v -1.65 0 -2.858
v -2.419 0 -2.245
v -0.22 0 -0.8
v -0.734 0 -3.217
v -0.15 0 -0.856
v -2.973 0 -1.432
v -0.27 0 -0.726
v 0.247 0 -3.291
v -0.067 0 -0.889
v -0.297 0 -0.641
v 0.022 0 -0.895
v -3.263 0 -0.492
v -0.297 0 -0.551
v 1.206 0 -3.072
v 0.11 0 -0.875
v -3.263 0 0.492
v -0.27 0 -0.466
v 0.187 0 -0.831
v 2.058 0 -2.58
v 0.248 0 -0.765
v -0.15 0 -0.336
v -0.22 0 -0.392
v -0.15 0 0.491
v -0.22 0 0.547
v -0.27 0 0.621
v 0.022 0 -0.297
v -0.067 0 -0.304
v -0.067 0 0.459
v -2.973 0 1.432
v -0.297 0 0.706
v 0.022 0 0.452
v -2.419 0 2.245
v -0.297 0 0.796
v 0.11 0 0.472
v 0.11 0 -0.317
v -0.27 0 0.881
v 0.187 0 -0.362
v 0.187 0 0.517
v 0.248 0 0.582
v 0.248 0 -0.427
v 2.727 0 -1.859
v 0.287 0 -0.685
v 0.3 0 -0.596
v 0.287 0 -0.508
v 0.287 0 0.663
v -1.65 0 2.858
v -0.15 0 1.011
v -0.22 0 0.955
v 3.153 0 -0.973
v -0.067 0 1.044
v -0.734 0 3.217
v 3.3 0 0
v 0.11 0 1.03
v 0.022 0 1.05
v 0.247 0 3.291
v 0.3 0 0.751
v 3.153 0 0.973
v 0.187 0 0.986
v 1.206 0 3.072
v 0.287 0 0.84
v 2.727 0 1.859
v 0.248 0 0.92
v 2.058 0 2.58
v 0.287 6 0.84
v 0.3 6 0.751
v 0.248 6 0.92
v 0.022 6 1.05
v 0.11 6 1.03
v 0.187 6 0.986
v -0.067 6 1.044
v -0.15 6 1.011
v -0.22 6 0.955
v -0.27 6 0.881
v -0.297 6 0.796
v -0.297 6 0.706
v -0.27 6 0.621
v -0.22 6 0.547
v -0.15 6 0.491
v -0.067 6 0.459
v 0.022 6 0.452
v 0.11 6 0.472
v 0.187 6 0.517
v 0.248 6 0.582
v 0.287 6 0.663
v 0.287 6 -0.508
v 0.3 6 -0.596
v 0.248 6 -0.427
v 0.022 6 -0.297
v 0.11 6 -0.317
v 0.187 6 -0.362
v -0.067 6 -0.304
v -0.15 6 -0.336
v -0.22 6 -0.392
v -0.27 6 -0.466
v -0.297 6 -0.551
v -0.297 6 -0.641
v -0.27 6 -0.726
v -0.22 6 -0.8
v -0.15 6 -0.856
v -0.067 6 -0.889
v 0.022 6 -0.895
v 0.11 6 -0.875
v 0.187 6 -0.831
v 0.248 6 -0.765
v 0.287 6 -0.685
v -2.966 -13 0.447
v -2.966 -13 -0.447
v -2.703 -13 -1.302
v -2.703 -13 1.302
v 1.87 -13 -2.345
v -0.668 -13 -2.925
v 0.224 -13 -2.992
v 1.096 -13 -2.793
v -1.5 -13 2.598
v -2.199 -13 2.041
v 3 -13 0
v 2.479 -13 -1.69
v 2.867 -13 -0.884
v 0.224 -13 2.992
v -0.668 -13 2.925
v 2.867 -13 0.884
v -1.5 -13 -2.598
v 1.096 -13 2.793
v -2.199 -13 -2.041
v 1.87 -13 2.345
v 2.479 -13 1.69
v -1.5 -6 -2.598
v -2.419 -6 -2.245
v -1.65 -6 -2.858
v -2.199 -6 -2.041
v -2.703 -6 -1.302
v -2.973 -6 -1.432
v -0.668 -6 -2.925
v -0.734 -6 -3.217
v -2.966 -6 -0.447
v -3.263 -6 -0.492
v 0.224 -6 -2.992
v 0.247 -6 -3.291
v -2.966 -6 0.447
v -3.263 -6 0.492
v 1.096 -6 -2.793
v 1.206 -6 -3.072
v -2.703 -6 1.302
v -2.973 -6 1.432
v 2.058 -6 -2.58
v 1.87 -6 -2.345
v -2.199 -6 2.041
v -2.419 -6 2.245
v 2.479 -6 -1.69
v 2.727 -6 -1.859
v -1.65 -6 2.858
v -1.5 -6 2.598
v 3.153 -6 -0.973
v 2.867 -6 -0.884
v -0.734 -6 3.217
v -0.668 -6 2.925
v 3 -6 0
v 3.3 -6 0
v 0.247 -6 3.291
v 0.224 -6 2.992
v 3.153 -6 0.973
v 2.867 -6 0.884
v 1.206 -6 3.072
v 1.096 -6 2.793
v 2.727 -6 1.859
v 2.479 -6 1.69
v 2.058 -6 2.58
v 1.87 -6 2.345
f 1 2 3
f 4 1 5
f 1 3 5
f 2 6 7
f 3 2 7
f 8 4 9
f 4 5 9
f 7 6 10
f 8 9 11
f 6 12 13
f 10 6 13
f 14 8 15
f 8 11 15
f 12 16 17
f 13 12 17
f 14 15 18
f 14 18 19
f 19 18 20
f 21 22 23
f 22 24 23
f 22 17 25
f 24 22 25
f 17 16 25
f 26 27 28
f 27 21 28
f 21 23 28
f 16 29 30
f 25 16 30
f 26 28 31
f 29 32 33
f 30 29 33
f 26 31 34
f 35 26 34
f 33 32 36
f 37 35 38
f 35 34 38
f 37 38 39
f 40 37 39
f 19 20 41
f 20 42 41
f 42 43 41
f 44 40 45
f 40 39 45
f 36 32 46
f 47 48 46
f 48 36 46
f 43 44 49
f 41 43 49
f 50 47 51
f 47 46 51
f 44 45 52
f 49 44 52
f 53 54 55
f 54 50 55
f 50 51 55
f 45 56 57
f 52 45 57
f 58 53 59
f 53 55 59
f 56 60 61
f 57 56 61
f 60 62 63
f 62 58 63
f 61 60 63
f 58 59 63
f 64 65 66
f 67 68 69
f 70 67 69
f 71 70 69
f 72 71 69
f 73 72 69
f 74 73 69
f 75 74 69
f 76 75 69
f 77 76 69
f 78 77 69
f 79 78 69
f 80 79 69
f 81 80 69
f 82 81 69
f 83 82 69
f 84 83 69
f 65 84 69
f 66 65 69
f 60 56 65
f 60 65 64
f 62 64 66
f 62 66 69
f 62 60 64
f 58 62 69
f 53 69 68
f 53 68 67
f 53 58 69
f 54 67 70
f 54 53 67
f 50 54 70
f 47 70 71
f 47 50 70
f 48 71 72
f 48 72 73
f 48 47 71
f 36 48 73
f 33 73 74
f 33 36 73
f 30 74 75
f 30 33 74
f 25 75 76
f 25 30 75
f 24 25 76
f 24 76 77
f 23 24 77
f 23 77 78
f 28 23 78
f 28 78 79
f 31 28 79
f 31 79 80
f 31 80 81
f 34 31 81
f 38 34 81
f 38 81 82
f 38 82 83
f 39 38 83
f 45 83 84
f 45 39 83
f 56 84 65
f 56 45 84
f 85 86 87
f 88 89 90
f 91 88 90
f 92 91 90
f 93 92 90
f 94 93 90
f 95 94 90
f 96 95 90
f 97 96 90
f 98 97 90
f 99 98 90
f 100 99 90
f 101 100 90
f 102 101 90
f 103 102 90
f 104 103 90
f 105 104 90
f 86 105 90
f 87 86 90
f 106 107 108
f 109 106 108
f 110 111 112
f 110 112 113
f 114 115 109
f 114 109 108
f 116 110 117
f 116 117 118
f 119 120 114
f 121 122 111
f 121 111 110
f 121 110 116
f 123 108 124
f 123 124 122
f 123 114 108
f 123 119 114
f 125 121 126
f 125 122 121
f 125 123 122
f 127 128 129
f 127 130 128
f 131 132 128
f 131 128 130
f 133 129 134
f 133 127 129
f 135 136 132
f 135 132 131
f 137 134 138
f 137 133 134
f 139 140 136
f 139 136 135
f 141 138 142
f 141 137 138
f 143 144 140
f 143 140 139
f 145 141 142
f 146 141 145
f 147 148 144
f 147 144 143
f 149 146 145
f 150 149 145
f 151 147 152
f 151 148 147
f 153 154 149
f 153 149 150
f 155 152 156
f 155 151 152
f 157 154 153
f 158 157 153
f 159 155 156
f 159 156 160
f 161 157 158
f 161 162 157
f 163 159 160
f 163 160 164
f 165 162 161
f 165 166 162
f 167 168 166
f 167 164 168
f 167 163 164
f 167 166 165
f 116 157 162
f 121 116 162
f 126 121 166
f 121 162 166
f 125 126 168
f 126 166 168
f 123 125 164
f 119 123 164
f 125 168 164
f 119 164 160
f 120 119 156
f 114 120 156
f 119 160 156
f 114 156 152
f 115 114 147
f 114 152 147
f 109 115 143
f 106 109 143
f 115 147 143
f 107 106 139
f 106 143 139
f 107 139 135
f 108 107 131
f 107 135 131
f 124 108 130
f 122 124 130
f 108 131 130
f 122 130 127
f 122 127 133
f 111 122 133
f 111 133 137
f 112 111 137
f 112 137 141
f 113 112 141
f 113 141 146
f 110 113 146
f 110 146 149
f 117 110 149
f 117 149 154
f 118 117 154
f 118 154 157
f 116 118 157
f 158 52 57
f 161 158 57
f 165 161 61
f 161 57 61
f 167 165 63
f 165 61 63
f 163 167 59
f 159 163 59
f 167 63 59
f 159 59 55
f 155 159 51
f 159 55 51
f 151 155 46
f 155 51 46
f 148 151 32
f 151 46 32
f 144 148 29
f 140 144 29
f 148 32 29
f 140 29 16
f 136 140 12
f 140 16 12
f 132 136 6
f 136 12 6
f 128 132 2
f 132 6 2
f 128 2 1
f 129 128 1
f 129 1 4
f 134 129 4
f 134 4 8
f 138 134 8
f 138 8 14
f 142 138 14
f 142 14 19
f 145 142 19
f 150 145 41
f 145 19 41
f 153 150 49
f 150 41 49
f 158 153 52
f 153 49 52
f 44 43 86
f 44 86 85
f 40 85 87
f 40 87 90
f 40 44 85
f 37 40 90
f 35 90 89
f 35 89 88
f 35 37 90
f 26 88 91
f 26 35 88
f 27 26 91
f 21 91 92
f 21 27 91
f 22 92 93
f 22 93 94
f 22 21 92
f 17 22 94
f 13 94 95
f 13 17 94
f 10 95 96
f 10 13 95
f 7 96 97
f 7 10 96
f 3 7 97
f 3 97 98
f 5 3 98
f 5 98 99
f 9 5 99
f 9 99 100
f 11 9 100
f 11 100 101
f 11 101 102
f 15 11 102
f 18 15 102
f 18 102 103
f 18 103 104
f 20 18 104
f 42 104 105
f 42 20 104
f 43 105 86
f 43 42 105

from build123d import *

# Parameters (mm, degrees)
F0_R     = 3
F0_R_2   = 0.3
F1_DEPTH = 13
F0_R_3   = 3.3
F2_DEPTH = 6
F3_DEPTH = 6


with BuildPart() as f1:
    # F0 (on Front) → F1 (new body)
    with BuildSketch(Plane.XZ):
        Circle(F0_R)
        with Locations((0, -0.5961988354)):
            Circle(F0_R_2, mode=Mode.SUBTRACT)
        with Locations((0, 0.7511804579)):
            Circle(F0_R_2, mode=Mode.SUBTRACT)
        with Locations((0, 0.7511804579)):
            Circle(F0_R_2)
        with Locations((0, -0.5961988354)):
            Circle(F0_R_2)
    extrude(amount=F1_DEPTH)

    # F0 (on Front) → F2 (join)
    with BuildSketch(Plane.XZ):
        Circle(F0_R_3)
        Circle(F0_R, mode=Mode.SUBTRACT)
    extrude(amount=F2_DEPTH)

    # F0 (on Front) → F3 (join)
    with BuildSketch(Plane.XZ):
        with Locations((0, 0.7511804579)):
            Circle(F0_R_2)
        with Locations((0, -0.5961988354)):
            Circle(F0_R_2)
    extrude(amount=-F3_DEPTH)


solid = f1.part
